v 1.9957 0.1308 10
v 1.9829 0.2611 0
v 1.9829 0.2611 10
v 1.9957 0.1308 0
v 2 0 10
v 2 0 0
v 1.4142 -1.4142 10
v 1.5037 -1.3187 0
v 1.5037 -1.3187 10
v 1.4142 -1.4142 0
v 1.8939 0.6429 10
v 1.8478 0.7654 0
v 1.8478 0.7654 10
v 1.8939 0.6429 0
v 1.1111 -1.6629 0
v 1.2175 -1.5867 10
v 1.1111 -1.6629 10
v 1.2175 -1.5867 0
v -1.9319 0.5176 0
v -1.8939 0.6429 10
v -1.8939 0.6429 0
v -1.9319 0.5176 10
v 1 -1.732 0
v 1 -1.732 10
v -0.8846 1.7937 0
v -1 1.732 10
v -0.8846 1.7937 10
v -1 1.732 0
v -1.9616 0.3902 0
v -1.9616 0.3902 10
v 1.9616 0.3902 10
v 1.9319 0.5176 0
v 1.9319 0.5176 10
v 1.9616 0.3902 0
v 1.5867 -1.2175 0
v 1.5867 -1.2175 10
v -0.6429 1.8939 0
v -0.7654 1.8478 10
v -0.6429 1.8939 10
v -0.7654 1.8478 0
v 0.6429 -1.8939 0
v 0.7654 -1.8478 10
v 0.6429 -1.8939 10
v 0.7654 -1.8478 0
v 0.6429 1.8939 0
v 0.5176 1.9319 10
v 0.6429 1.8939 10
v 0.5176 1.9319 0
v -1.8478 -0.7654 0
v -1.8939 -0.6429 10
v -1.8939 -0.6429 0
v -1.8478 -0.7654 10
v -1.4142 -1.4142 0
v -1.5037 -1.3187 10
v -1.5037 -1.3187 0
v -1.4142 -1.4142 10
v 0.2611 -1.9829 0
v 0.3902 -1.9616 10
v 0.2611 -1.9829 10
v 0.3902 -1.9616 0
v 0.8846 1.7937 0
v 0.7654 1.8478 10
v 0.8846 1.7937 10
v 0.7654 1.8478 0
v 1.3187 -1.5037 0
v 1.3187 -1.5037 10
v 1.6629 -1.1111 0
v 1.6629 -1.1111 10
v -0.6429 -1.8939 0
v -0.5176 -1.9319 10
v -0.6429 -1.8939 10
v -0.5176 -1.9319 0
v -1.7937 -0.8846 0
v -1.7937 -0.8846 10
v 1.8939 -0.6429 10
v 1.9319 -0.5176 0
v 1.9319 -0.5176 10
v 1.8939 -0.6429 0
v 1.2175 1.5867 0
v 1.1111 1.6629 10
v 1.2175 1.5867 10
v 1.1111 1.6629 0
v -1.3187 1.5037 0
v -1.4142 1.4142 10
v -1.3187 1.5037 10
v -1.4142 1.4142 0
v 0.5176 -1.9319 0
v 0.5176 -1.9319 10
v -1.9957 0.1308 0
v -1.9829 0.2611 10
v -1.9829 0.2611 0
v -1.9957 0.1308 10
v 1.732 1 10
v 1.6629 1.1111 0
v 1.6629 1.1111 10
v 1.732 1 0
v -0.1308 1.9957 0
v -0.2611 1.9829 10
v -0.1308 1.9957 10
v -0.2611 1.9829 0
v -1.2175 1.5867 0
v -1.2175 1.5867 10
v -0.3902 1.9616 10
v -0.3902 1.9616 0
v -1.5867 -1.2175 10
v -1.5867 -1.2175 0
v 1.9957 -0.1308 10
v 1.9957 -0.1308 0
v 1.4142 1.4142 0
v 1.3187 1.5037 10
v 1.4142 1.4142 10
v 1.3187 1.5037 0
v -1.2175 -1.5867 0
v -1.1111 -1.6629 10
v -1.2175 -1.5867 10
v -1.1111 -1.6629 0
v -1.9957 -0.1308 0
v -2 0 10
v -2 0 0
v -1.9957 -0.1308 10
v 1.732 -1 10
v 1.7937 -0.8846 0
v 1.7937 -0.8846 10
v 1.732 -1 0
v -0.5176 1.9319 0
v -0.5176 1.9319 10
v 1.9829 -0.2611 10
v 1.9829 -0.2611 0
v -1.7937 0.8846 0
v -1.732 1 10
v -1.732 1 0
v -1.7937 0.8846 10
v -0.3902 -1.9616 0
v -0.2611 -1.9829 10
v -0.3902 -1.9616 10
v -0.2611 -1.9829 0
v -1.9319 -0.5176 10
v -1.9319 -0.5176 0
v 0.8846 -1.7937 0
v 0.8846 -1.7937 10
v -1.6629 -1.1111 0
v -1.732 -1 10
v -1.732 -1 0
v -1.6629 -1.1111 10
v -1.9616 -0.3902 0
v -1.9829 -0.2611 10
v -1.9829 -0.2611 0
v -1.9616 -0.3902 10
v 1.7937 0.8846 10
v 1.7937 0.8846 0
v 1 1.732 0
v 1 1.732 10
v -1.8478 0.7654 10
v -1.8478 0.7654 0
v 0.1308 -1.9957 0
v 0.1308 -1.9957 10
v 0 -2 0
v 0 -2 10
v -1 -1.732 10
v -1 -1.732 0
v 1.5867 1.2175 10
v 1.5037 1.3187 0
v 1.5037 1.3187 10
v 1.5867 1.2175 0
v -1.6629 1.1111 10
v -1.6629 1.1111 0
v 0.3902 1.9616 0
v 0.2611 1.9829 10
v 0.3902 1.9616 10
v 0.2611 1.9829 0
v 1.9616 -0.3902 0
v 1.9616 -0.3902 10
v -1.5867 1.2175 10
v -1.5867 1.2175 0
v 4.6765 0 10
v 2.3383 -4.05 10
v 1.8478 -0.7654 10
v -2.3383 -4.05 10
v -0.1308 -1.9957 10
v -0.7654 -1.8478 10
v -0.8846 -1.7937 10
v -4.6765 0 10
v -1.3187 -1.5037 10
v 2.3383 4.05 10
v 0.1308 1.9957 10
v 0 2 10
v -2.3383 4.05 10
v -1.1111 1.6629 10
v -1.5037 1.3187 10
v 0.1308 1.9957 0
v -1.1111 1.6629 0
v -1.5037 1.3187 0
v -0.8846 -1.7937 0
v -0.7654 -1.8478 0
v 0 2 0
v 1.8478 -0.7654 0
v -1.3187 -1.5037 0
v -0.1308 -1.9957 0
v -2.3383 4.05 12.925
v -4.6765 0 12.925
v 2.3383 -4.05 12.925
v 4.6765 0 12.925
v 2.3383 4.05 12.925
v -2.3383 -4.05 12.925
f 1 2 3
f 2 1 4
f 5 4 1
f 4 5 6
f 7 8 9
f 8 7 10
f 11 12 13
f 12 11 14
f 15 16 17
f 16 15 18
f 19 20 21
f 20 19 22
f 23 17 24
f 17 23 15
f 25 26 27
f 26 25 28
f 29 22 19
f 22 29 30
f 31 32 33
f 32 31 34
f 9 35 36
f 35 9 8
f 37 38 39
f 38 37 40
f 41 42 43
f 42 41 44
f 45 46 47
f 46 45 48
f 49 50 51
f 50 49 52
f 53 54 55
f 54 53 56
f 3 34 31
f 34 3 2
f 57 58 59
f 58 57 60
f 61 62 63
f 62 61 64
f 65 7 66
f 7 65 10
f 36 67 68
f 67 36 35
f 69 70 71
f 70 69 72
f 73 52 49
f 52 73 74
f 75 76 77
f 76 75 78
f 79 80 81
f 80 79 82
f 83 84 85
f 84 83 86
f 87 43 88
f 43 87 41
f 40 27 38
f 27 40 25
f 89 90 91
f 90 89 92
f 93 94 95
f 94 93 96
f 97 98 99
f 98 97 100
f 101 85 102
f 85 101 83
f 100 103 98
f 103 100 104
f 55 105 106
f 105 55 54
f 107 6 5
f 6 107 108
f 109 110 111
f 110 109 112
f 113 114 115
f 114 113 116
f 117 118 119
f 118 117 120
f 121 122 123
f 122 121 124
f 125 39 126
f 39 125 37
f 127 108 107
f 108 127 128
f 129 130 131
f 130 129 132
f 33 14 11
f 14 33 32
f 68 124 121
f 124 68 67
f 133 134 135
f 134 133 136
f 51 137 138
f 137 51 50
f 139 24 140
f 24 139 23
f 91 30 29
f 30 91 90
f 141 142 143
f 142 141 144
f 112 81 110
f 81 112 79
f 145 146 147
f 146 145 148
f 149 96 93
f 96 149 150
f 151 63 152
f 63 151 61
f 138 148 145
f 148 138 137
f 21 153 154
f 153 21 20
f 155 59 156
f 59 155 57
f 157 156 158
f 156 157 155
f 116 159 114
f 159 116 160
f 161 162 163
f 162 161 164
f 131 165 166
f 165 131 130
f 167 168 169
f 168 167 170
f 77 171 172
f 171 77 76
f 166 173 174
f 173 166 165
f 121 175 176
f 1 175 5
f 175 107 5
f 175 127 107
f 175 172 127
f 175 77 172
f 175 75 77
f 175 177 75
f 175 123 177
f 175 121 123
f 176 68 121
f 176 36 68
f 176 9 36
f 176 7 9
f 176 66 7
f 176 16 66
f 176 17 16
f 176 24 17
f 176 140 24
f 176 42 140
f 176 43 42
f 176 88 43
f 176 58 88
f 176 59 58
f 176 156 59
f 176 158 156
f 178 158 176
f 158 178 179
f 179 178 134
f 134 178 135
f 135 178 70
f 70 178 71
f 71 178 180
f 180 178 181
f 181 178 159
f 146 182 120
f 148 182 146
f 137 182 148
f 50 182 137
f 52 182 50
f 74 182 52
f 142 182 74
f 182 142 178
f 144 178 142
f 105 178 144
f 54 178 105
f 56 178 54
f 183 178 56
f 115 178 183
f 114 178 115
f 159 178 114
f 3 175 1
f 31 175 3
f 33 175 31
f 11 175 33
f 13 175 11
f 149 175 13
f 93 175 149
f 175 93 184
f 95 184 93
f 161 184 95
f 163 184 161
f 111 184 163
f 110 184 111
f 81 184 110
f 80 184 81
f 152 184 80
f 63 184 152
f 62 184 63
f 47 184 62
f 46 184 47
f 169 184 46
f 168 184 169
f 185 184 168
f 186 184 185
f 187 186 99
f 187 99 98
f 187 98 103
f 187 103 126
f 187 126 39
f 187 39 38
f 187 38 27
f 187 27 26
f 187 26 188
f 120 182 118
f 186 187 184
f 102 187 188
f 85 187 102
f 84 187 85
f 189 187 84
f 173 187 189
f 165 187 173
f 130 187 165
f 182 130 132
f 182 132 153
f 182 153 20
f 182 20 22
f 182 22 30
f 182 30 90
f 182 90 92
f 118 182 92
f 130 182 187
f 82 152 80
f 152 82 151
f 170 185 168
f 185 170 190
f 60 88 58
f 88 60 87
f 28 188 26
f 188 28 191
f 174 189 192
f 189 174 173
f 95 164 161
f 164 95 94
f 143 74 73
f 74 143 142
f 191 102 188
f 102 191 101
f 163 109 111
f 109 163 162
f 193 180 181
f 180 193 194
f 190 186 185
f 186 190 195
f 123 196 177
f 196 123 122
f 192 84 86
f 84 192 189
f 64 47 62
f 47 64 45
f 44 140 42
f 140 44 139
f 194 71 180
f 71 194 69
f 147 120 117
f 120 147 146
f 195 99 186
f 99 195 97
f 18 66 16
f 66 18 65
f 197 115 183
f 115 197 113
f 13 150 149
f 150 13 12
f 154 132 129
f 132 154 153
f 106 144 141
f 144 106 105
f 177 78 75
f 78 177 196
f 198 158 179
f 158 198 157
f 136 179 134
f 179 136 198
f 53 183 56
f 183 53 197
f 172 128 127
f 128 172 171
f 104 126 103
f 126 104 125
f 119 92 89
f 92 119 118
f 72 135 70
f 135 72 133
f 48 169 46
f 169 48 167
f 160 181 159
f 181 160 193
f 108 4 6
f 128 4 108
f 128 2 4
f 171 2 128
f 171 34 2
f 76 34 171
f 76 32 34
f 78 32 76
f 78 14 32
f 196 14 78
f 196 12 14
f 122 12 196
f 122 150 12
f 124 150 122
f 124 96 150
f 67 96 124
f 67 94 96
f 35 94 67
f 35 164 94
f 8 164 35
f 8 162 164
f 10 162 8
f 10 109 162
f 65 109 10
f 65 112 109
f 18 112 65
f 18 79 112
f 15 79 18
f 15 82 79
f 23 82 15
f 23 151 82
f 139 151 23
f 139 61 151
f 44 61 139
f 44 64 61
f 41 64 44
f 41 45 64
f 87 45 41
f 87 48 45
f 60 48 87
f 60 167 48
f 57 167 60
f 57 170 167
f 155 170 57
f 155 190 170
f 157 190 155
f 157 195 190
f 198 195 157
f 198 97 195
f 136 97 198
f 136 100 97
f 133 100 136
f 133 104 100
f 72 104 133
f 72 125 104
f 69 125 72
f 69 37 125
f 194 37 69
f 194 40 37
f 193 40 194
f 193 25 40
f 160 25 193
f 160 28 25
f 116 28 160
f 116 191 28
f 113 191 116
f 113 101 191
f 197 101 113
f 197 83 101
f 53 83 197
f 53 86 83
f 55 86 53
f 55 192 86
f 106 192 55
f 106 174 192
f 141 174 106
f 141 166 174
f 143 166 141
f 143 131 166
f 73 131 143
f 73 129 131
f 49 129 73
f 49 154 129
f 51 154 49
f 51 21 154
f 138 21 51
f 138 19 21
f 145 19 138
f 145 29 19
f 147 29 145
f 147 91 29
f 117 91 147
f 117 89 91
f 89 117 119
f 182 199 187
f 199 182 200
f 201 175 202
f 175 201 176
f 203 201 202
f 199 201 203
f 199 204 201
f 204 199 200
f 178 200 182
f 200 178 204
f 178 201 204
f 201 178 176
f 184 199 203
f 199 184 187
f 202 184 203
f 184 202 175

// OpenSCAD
$fn=96;

shaft_d = 4.0;
length = 10.0;

head_flat_d = 8.1;      // across flats
head_h = 2.925;

module hex_prism(af, h){
    // Regular hex: across flats = sqrt(3)*R  => R = af/sqrt(3)
    R = af / sqrt(3);
    linear_extrude(height=h)
        polygon([ for(i=[0:5]) [ R*cos(60*i), R*sin(60*i) ] ]);
}

union(){
    // Shaft
    cylinder(d=shaft_d, h=length);

    // Hex head on top
    translate([0,0,length])
        hex_prism(head_flat_d, head_h);
}
